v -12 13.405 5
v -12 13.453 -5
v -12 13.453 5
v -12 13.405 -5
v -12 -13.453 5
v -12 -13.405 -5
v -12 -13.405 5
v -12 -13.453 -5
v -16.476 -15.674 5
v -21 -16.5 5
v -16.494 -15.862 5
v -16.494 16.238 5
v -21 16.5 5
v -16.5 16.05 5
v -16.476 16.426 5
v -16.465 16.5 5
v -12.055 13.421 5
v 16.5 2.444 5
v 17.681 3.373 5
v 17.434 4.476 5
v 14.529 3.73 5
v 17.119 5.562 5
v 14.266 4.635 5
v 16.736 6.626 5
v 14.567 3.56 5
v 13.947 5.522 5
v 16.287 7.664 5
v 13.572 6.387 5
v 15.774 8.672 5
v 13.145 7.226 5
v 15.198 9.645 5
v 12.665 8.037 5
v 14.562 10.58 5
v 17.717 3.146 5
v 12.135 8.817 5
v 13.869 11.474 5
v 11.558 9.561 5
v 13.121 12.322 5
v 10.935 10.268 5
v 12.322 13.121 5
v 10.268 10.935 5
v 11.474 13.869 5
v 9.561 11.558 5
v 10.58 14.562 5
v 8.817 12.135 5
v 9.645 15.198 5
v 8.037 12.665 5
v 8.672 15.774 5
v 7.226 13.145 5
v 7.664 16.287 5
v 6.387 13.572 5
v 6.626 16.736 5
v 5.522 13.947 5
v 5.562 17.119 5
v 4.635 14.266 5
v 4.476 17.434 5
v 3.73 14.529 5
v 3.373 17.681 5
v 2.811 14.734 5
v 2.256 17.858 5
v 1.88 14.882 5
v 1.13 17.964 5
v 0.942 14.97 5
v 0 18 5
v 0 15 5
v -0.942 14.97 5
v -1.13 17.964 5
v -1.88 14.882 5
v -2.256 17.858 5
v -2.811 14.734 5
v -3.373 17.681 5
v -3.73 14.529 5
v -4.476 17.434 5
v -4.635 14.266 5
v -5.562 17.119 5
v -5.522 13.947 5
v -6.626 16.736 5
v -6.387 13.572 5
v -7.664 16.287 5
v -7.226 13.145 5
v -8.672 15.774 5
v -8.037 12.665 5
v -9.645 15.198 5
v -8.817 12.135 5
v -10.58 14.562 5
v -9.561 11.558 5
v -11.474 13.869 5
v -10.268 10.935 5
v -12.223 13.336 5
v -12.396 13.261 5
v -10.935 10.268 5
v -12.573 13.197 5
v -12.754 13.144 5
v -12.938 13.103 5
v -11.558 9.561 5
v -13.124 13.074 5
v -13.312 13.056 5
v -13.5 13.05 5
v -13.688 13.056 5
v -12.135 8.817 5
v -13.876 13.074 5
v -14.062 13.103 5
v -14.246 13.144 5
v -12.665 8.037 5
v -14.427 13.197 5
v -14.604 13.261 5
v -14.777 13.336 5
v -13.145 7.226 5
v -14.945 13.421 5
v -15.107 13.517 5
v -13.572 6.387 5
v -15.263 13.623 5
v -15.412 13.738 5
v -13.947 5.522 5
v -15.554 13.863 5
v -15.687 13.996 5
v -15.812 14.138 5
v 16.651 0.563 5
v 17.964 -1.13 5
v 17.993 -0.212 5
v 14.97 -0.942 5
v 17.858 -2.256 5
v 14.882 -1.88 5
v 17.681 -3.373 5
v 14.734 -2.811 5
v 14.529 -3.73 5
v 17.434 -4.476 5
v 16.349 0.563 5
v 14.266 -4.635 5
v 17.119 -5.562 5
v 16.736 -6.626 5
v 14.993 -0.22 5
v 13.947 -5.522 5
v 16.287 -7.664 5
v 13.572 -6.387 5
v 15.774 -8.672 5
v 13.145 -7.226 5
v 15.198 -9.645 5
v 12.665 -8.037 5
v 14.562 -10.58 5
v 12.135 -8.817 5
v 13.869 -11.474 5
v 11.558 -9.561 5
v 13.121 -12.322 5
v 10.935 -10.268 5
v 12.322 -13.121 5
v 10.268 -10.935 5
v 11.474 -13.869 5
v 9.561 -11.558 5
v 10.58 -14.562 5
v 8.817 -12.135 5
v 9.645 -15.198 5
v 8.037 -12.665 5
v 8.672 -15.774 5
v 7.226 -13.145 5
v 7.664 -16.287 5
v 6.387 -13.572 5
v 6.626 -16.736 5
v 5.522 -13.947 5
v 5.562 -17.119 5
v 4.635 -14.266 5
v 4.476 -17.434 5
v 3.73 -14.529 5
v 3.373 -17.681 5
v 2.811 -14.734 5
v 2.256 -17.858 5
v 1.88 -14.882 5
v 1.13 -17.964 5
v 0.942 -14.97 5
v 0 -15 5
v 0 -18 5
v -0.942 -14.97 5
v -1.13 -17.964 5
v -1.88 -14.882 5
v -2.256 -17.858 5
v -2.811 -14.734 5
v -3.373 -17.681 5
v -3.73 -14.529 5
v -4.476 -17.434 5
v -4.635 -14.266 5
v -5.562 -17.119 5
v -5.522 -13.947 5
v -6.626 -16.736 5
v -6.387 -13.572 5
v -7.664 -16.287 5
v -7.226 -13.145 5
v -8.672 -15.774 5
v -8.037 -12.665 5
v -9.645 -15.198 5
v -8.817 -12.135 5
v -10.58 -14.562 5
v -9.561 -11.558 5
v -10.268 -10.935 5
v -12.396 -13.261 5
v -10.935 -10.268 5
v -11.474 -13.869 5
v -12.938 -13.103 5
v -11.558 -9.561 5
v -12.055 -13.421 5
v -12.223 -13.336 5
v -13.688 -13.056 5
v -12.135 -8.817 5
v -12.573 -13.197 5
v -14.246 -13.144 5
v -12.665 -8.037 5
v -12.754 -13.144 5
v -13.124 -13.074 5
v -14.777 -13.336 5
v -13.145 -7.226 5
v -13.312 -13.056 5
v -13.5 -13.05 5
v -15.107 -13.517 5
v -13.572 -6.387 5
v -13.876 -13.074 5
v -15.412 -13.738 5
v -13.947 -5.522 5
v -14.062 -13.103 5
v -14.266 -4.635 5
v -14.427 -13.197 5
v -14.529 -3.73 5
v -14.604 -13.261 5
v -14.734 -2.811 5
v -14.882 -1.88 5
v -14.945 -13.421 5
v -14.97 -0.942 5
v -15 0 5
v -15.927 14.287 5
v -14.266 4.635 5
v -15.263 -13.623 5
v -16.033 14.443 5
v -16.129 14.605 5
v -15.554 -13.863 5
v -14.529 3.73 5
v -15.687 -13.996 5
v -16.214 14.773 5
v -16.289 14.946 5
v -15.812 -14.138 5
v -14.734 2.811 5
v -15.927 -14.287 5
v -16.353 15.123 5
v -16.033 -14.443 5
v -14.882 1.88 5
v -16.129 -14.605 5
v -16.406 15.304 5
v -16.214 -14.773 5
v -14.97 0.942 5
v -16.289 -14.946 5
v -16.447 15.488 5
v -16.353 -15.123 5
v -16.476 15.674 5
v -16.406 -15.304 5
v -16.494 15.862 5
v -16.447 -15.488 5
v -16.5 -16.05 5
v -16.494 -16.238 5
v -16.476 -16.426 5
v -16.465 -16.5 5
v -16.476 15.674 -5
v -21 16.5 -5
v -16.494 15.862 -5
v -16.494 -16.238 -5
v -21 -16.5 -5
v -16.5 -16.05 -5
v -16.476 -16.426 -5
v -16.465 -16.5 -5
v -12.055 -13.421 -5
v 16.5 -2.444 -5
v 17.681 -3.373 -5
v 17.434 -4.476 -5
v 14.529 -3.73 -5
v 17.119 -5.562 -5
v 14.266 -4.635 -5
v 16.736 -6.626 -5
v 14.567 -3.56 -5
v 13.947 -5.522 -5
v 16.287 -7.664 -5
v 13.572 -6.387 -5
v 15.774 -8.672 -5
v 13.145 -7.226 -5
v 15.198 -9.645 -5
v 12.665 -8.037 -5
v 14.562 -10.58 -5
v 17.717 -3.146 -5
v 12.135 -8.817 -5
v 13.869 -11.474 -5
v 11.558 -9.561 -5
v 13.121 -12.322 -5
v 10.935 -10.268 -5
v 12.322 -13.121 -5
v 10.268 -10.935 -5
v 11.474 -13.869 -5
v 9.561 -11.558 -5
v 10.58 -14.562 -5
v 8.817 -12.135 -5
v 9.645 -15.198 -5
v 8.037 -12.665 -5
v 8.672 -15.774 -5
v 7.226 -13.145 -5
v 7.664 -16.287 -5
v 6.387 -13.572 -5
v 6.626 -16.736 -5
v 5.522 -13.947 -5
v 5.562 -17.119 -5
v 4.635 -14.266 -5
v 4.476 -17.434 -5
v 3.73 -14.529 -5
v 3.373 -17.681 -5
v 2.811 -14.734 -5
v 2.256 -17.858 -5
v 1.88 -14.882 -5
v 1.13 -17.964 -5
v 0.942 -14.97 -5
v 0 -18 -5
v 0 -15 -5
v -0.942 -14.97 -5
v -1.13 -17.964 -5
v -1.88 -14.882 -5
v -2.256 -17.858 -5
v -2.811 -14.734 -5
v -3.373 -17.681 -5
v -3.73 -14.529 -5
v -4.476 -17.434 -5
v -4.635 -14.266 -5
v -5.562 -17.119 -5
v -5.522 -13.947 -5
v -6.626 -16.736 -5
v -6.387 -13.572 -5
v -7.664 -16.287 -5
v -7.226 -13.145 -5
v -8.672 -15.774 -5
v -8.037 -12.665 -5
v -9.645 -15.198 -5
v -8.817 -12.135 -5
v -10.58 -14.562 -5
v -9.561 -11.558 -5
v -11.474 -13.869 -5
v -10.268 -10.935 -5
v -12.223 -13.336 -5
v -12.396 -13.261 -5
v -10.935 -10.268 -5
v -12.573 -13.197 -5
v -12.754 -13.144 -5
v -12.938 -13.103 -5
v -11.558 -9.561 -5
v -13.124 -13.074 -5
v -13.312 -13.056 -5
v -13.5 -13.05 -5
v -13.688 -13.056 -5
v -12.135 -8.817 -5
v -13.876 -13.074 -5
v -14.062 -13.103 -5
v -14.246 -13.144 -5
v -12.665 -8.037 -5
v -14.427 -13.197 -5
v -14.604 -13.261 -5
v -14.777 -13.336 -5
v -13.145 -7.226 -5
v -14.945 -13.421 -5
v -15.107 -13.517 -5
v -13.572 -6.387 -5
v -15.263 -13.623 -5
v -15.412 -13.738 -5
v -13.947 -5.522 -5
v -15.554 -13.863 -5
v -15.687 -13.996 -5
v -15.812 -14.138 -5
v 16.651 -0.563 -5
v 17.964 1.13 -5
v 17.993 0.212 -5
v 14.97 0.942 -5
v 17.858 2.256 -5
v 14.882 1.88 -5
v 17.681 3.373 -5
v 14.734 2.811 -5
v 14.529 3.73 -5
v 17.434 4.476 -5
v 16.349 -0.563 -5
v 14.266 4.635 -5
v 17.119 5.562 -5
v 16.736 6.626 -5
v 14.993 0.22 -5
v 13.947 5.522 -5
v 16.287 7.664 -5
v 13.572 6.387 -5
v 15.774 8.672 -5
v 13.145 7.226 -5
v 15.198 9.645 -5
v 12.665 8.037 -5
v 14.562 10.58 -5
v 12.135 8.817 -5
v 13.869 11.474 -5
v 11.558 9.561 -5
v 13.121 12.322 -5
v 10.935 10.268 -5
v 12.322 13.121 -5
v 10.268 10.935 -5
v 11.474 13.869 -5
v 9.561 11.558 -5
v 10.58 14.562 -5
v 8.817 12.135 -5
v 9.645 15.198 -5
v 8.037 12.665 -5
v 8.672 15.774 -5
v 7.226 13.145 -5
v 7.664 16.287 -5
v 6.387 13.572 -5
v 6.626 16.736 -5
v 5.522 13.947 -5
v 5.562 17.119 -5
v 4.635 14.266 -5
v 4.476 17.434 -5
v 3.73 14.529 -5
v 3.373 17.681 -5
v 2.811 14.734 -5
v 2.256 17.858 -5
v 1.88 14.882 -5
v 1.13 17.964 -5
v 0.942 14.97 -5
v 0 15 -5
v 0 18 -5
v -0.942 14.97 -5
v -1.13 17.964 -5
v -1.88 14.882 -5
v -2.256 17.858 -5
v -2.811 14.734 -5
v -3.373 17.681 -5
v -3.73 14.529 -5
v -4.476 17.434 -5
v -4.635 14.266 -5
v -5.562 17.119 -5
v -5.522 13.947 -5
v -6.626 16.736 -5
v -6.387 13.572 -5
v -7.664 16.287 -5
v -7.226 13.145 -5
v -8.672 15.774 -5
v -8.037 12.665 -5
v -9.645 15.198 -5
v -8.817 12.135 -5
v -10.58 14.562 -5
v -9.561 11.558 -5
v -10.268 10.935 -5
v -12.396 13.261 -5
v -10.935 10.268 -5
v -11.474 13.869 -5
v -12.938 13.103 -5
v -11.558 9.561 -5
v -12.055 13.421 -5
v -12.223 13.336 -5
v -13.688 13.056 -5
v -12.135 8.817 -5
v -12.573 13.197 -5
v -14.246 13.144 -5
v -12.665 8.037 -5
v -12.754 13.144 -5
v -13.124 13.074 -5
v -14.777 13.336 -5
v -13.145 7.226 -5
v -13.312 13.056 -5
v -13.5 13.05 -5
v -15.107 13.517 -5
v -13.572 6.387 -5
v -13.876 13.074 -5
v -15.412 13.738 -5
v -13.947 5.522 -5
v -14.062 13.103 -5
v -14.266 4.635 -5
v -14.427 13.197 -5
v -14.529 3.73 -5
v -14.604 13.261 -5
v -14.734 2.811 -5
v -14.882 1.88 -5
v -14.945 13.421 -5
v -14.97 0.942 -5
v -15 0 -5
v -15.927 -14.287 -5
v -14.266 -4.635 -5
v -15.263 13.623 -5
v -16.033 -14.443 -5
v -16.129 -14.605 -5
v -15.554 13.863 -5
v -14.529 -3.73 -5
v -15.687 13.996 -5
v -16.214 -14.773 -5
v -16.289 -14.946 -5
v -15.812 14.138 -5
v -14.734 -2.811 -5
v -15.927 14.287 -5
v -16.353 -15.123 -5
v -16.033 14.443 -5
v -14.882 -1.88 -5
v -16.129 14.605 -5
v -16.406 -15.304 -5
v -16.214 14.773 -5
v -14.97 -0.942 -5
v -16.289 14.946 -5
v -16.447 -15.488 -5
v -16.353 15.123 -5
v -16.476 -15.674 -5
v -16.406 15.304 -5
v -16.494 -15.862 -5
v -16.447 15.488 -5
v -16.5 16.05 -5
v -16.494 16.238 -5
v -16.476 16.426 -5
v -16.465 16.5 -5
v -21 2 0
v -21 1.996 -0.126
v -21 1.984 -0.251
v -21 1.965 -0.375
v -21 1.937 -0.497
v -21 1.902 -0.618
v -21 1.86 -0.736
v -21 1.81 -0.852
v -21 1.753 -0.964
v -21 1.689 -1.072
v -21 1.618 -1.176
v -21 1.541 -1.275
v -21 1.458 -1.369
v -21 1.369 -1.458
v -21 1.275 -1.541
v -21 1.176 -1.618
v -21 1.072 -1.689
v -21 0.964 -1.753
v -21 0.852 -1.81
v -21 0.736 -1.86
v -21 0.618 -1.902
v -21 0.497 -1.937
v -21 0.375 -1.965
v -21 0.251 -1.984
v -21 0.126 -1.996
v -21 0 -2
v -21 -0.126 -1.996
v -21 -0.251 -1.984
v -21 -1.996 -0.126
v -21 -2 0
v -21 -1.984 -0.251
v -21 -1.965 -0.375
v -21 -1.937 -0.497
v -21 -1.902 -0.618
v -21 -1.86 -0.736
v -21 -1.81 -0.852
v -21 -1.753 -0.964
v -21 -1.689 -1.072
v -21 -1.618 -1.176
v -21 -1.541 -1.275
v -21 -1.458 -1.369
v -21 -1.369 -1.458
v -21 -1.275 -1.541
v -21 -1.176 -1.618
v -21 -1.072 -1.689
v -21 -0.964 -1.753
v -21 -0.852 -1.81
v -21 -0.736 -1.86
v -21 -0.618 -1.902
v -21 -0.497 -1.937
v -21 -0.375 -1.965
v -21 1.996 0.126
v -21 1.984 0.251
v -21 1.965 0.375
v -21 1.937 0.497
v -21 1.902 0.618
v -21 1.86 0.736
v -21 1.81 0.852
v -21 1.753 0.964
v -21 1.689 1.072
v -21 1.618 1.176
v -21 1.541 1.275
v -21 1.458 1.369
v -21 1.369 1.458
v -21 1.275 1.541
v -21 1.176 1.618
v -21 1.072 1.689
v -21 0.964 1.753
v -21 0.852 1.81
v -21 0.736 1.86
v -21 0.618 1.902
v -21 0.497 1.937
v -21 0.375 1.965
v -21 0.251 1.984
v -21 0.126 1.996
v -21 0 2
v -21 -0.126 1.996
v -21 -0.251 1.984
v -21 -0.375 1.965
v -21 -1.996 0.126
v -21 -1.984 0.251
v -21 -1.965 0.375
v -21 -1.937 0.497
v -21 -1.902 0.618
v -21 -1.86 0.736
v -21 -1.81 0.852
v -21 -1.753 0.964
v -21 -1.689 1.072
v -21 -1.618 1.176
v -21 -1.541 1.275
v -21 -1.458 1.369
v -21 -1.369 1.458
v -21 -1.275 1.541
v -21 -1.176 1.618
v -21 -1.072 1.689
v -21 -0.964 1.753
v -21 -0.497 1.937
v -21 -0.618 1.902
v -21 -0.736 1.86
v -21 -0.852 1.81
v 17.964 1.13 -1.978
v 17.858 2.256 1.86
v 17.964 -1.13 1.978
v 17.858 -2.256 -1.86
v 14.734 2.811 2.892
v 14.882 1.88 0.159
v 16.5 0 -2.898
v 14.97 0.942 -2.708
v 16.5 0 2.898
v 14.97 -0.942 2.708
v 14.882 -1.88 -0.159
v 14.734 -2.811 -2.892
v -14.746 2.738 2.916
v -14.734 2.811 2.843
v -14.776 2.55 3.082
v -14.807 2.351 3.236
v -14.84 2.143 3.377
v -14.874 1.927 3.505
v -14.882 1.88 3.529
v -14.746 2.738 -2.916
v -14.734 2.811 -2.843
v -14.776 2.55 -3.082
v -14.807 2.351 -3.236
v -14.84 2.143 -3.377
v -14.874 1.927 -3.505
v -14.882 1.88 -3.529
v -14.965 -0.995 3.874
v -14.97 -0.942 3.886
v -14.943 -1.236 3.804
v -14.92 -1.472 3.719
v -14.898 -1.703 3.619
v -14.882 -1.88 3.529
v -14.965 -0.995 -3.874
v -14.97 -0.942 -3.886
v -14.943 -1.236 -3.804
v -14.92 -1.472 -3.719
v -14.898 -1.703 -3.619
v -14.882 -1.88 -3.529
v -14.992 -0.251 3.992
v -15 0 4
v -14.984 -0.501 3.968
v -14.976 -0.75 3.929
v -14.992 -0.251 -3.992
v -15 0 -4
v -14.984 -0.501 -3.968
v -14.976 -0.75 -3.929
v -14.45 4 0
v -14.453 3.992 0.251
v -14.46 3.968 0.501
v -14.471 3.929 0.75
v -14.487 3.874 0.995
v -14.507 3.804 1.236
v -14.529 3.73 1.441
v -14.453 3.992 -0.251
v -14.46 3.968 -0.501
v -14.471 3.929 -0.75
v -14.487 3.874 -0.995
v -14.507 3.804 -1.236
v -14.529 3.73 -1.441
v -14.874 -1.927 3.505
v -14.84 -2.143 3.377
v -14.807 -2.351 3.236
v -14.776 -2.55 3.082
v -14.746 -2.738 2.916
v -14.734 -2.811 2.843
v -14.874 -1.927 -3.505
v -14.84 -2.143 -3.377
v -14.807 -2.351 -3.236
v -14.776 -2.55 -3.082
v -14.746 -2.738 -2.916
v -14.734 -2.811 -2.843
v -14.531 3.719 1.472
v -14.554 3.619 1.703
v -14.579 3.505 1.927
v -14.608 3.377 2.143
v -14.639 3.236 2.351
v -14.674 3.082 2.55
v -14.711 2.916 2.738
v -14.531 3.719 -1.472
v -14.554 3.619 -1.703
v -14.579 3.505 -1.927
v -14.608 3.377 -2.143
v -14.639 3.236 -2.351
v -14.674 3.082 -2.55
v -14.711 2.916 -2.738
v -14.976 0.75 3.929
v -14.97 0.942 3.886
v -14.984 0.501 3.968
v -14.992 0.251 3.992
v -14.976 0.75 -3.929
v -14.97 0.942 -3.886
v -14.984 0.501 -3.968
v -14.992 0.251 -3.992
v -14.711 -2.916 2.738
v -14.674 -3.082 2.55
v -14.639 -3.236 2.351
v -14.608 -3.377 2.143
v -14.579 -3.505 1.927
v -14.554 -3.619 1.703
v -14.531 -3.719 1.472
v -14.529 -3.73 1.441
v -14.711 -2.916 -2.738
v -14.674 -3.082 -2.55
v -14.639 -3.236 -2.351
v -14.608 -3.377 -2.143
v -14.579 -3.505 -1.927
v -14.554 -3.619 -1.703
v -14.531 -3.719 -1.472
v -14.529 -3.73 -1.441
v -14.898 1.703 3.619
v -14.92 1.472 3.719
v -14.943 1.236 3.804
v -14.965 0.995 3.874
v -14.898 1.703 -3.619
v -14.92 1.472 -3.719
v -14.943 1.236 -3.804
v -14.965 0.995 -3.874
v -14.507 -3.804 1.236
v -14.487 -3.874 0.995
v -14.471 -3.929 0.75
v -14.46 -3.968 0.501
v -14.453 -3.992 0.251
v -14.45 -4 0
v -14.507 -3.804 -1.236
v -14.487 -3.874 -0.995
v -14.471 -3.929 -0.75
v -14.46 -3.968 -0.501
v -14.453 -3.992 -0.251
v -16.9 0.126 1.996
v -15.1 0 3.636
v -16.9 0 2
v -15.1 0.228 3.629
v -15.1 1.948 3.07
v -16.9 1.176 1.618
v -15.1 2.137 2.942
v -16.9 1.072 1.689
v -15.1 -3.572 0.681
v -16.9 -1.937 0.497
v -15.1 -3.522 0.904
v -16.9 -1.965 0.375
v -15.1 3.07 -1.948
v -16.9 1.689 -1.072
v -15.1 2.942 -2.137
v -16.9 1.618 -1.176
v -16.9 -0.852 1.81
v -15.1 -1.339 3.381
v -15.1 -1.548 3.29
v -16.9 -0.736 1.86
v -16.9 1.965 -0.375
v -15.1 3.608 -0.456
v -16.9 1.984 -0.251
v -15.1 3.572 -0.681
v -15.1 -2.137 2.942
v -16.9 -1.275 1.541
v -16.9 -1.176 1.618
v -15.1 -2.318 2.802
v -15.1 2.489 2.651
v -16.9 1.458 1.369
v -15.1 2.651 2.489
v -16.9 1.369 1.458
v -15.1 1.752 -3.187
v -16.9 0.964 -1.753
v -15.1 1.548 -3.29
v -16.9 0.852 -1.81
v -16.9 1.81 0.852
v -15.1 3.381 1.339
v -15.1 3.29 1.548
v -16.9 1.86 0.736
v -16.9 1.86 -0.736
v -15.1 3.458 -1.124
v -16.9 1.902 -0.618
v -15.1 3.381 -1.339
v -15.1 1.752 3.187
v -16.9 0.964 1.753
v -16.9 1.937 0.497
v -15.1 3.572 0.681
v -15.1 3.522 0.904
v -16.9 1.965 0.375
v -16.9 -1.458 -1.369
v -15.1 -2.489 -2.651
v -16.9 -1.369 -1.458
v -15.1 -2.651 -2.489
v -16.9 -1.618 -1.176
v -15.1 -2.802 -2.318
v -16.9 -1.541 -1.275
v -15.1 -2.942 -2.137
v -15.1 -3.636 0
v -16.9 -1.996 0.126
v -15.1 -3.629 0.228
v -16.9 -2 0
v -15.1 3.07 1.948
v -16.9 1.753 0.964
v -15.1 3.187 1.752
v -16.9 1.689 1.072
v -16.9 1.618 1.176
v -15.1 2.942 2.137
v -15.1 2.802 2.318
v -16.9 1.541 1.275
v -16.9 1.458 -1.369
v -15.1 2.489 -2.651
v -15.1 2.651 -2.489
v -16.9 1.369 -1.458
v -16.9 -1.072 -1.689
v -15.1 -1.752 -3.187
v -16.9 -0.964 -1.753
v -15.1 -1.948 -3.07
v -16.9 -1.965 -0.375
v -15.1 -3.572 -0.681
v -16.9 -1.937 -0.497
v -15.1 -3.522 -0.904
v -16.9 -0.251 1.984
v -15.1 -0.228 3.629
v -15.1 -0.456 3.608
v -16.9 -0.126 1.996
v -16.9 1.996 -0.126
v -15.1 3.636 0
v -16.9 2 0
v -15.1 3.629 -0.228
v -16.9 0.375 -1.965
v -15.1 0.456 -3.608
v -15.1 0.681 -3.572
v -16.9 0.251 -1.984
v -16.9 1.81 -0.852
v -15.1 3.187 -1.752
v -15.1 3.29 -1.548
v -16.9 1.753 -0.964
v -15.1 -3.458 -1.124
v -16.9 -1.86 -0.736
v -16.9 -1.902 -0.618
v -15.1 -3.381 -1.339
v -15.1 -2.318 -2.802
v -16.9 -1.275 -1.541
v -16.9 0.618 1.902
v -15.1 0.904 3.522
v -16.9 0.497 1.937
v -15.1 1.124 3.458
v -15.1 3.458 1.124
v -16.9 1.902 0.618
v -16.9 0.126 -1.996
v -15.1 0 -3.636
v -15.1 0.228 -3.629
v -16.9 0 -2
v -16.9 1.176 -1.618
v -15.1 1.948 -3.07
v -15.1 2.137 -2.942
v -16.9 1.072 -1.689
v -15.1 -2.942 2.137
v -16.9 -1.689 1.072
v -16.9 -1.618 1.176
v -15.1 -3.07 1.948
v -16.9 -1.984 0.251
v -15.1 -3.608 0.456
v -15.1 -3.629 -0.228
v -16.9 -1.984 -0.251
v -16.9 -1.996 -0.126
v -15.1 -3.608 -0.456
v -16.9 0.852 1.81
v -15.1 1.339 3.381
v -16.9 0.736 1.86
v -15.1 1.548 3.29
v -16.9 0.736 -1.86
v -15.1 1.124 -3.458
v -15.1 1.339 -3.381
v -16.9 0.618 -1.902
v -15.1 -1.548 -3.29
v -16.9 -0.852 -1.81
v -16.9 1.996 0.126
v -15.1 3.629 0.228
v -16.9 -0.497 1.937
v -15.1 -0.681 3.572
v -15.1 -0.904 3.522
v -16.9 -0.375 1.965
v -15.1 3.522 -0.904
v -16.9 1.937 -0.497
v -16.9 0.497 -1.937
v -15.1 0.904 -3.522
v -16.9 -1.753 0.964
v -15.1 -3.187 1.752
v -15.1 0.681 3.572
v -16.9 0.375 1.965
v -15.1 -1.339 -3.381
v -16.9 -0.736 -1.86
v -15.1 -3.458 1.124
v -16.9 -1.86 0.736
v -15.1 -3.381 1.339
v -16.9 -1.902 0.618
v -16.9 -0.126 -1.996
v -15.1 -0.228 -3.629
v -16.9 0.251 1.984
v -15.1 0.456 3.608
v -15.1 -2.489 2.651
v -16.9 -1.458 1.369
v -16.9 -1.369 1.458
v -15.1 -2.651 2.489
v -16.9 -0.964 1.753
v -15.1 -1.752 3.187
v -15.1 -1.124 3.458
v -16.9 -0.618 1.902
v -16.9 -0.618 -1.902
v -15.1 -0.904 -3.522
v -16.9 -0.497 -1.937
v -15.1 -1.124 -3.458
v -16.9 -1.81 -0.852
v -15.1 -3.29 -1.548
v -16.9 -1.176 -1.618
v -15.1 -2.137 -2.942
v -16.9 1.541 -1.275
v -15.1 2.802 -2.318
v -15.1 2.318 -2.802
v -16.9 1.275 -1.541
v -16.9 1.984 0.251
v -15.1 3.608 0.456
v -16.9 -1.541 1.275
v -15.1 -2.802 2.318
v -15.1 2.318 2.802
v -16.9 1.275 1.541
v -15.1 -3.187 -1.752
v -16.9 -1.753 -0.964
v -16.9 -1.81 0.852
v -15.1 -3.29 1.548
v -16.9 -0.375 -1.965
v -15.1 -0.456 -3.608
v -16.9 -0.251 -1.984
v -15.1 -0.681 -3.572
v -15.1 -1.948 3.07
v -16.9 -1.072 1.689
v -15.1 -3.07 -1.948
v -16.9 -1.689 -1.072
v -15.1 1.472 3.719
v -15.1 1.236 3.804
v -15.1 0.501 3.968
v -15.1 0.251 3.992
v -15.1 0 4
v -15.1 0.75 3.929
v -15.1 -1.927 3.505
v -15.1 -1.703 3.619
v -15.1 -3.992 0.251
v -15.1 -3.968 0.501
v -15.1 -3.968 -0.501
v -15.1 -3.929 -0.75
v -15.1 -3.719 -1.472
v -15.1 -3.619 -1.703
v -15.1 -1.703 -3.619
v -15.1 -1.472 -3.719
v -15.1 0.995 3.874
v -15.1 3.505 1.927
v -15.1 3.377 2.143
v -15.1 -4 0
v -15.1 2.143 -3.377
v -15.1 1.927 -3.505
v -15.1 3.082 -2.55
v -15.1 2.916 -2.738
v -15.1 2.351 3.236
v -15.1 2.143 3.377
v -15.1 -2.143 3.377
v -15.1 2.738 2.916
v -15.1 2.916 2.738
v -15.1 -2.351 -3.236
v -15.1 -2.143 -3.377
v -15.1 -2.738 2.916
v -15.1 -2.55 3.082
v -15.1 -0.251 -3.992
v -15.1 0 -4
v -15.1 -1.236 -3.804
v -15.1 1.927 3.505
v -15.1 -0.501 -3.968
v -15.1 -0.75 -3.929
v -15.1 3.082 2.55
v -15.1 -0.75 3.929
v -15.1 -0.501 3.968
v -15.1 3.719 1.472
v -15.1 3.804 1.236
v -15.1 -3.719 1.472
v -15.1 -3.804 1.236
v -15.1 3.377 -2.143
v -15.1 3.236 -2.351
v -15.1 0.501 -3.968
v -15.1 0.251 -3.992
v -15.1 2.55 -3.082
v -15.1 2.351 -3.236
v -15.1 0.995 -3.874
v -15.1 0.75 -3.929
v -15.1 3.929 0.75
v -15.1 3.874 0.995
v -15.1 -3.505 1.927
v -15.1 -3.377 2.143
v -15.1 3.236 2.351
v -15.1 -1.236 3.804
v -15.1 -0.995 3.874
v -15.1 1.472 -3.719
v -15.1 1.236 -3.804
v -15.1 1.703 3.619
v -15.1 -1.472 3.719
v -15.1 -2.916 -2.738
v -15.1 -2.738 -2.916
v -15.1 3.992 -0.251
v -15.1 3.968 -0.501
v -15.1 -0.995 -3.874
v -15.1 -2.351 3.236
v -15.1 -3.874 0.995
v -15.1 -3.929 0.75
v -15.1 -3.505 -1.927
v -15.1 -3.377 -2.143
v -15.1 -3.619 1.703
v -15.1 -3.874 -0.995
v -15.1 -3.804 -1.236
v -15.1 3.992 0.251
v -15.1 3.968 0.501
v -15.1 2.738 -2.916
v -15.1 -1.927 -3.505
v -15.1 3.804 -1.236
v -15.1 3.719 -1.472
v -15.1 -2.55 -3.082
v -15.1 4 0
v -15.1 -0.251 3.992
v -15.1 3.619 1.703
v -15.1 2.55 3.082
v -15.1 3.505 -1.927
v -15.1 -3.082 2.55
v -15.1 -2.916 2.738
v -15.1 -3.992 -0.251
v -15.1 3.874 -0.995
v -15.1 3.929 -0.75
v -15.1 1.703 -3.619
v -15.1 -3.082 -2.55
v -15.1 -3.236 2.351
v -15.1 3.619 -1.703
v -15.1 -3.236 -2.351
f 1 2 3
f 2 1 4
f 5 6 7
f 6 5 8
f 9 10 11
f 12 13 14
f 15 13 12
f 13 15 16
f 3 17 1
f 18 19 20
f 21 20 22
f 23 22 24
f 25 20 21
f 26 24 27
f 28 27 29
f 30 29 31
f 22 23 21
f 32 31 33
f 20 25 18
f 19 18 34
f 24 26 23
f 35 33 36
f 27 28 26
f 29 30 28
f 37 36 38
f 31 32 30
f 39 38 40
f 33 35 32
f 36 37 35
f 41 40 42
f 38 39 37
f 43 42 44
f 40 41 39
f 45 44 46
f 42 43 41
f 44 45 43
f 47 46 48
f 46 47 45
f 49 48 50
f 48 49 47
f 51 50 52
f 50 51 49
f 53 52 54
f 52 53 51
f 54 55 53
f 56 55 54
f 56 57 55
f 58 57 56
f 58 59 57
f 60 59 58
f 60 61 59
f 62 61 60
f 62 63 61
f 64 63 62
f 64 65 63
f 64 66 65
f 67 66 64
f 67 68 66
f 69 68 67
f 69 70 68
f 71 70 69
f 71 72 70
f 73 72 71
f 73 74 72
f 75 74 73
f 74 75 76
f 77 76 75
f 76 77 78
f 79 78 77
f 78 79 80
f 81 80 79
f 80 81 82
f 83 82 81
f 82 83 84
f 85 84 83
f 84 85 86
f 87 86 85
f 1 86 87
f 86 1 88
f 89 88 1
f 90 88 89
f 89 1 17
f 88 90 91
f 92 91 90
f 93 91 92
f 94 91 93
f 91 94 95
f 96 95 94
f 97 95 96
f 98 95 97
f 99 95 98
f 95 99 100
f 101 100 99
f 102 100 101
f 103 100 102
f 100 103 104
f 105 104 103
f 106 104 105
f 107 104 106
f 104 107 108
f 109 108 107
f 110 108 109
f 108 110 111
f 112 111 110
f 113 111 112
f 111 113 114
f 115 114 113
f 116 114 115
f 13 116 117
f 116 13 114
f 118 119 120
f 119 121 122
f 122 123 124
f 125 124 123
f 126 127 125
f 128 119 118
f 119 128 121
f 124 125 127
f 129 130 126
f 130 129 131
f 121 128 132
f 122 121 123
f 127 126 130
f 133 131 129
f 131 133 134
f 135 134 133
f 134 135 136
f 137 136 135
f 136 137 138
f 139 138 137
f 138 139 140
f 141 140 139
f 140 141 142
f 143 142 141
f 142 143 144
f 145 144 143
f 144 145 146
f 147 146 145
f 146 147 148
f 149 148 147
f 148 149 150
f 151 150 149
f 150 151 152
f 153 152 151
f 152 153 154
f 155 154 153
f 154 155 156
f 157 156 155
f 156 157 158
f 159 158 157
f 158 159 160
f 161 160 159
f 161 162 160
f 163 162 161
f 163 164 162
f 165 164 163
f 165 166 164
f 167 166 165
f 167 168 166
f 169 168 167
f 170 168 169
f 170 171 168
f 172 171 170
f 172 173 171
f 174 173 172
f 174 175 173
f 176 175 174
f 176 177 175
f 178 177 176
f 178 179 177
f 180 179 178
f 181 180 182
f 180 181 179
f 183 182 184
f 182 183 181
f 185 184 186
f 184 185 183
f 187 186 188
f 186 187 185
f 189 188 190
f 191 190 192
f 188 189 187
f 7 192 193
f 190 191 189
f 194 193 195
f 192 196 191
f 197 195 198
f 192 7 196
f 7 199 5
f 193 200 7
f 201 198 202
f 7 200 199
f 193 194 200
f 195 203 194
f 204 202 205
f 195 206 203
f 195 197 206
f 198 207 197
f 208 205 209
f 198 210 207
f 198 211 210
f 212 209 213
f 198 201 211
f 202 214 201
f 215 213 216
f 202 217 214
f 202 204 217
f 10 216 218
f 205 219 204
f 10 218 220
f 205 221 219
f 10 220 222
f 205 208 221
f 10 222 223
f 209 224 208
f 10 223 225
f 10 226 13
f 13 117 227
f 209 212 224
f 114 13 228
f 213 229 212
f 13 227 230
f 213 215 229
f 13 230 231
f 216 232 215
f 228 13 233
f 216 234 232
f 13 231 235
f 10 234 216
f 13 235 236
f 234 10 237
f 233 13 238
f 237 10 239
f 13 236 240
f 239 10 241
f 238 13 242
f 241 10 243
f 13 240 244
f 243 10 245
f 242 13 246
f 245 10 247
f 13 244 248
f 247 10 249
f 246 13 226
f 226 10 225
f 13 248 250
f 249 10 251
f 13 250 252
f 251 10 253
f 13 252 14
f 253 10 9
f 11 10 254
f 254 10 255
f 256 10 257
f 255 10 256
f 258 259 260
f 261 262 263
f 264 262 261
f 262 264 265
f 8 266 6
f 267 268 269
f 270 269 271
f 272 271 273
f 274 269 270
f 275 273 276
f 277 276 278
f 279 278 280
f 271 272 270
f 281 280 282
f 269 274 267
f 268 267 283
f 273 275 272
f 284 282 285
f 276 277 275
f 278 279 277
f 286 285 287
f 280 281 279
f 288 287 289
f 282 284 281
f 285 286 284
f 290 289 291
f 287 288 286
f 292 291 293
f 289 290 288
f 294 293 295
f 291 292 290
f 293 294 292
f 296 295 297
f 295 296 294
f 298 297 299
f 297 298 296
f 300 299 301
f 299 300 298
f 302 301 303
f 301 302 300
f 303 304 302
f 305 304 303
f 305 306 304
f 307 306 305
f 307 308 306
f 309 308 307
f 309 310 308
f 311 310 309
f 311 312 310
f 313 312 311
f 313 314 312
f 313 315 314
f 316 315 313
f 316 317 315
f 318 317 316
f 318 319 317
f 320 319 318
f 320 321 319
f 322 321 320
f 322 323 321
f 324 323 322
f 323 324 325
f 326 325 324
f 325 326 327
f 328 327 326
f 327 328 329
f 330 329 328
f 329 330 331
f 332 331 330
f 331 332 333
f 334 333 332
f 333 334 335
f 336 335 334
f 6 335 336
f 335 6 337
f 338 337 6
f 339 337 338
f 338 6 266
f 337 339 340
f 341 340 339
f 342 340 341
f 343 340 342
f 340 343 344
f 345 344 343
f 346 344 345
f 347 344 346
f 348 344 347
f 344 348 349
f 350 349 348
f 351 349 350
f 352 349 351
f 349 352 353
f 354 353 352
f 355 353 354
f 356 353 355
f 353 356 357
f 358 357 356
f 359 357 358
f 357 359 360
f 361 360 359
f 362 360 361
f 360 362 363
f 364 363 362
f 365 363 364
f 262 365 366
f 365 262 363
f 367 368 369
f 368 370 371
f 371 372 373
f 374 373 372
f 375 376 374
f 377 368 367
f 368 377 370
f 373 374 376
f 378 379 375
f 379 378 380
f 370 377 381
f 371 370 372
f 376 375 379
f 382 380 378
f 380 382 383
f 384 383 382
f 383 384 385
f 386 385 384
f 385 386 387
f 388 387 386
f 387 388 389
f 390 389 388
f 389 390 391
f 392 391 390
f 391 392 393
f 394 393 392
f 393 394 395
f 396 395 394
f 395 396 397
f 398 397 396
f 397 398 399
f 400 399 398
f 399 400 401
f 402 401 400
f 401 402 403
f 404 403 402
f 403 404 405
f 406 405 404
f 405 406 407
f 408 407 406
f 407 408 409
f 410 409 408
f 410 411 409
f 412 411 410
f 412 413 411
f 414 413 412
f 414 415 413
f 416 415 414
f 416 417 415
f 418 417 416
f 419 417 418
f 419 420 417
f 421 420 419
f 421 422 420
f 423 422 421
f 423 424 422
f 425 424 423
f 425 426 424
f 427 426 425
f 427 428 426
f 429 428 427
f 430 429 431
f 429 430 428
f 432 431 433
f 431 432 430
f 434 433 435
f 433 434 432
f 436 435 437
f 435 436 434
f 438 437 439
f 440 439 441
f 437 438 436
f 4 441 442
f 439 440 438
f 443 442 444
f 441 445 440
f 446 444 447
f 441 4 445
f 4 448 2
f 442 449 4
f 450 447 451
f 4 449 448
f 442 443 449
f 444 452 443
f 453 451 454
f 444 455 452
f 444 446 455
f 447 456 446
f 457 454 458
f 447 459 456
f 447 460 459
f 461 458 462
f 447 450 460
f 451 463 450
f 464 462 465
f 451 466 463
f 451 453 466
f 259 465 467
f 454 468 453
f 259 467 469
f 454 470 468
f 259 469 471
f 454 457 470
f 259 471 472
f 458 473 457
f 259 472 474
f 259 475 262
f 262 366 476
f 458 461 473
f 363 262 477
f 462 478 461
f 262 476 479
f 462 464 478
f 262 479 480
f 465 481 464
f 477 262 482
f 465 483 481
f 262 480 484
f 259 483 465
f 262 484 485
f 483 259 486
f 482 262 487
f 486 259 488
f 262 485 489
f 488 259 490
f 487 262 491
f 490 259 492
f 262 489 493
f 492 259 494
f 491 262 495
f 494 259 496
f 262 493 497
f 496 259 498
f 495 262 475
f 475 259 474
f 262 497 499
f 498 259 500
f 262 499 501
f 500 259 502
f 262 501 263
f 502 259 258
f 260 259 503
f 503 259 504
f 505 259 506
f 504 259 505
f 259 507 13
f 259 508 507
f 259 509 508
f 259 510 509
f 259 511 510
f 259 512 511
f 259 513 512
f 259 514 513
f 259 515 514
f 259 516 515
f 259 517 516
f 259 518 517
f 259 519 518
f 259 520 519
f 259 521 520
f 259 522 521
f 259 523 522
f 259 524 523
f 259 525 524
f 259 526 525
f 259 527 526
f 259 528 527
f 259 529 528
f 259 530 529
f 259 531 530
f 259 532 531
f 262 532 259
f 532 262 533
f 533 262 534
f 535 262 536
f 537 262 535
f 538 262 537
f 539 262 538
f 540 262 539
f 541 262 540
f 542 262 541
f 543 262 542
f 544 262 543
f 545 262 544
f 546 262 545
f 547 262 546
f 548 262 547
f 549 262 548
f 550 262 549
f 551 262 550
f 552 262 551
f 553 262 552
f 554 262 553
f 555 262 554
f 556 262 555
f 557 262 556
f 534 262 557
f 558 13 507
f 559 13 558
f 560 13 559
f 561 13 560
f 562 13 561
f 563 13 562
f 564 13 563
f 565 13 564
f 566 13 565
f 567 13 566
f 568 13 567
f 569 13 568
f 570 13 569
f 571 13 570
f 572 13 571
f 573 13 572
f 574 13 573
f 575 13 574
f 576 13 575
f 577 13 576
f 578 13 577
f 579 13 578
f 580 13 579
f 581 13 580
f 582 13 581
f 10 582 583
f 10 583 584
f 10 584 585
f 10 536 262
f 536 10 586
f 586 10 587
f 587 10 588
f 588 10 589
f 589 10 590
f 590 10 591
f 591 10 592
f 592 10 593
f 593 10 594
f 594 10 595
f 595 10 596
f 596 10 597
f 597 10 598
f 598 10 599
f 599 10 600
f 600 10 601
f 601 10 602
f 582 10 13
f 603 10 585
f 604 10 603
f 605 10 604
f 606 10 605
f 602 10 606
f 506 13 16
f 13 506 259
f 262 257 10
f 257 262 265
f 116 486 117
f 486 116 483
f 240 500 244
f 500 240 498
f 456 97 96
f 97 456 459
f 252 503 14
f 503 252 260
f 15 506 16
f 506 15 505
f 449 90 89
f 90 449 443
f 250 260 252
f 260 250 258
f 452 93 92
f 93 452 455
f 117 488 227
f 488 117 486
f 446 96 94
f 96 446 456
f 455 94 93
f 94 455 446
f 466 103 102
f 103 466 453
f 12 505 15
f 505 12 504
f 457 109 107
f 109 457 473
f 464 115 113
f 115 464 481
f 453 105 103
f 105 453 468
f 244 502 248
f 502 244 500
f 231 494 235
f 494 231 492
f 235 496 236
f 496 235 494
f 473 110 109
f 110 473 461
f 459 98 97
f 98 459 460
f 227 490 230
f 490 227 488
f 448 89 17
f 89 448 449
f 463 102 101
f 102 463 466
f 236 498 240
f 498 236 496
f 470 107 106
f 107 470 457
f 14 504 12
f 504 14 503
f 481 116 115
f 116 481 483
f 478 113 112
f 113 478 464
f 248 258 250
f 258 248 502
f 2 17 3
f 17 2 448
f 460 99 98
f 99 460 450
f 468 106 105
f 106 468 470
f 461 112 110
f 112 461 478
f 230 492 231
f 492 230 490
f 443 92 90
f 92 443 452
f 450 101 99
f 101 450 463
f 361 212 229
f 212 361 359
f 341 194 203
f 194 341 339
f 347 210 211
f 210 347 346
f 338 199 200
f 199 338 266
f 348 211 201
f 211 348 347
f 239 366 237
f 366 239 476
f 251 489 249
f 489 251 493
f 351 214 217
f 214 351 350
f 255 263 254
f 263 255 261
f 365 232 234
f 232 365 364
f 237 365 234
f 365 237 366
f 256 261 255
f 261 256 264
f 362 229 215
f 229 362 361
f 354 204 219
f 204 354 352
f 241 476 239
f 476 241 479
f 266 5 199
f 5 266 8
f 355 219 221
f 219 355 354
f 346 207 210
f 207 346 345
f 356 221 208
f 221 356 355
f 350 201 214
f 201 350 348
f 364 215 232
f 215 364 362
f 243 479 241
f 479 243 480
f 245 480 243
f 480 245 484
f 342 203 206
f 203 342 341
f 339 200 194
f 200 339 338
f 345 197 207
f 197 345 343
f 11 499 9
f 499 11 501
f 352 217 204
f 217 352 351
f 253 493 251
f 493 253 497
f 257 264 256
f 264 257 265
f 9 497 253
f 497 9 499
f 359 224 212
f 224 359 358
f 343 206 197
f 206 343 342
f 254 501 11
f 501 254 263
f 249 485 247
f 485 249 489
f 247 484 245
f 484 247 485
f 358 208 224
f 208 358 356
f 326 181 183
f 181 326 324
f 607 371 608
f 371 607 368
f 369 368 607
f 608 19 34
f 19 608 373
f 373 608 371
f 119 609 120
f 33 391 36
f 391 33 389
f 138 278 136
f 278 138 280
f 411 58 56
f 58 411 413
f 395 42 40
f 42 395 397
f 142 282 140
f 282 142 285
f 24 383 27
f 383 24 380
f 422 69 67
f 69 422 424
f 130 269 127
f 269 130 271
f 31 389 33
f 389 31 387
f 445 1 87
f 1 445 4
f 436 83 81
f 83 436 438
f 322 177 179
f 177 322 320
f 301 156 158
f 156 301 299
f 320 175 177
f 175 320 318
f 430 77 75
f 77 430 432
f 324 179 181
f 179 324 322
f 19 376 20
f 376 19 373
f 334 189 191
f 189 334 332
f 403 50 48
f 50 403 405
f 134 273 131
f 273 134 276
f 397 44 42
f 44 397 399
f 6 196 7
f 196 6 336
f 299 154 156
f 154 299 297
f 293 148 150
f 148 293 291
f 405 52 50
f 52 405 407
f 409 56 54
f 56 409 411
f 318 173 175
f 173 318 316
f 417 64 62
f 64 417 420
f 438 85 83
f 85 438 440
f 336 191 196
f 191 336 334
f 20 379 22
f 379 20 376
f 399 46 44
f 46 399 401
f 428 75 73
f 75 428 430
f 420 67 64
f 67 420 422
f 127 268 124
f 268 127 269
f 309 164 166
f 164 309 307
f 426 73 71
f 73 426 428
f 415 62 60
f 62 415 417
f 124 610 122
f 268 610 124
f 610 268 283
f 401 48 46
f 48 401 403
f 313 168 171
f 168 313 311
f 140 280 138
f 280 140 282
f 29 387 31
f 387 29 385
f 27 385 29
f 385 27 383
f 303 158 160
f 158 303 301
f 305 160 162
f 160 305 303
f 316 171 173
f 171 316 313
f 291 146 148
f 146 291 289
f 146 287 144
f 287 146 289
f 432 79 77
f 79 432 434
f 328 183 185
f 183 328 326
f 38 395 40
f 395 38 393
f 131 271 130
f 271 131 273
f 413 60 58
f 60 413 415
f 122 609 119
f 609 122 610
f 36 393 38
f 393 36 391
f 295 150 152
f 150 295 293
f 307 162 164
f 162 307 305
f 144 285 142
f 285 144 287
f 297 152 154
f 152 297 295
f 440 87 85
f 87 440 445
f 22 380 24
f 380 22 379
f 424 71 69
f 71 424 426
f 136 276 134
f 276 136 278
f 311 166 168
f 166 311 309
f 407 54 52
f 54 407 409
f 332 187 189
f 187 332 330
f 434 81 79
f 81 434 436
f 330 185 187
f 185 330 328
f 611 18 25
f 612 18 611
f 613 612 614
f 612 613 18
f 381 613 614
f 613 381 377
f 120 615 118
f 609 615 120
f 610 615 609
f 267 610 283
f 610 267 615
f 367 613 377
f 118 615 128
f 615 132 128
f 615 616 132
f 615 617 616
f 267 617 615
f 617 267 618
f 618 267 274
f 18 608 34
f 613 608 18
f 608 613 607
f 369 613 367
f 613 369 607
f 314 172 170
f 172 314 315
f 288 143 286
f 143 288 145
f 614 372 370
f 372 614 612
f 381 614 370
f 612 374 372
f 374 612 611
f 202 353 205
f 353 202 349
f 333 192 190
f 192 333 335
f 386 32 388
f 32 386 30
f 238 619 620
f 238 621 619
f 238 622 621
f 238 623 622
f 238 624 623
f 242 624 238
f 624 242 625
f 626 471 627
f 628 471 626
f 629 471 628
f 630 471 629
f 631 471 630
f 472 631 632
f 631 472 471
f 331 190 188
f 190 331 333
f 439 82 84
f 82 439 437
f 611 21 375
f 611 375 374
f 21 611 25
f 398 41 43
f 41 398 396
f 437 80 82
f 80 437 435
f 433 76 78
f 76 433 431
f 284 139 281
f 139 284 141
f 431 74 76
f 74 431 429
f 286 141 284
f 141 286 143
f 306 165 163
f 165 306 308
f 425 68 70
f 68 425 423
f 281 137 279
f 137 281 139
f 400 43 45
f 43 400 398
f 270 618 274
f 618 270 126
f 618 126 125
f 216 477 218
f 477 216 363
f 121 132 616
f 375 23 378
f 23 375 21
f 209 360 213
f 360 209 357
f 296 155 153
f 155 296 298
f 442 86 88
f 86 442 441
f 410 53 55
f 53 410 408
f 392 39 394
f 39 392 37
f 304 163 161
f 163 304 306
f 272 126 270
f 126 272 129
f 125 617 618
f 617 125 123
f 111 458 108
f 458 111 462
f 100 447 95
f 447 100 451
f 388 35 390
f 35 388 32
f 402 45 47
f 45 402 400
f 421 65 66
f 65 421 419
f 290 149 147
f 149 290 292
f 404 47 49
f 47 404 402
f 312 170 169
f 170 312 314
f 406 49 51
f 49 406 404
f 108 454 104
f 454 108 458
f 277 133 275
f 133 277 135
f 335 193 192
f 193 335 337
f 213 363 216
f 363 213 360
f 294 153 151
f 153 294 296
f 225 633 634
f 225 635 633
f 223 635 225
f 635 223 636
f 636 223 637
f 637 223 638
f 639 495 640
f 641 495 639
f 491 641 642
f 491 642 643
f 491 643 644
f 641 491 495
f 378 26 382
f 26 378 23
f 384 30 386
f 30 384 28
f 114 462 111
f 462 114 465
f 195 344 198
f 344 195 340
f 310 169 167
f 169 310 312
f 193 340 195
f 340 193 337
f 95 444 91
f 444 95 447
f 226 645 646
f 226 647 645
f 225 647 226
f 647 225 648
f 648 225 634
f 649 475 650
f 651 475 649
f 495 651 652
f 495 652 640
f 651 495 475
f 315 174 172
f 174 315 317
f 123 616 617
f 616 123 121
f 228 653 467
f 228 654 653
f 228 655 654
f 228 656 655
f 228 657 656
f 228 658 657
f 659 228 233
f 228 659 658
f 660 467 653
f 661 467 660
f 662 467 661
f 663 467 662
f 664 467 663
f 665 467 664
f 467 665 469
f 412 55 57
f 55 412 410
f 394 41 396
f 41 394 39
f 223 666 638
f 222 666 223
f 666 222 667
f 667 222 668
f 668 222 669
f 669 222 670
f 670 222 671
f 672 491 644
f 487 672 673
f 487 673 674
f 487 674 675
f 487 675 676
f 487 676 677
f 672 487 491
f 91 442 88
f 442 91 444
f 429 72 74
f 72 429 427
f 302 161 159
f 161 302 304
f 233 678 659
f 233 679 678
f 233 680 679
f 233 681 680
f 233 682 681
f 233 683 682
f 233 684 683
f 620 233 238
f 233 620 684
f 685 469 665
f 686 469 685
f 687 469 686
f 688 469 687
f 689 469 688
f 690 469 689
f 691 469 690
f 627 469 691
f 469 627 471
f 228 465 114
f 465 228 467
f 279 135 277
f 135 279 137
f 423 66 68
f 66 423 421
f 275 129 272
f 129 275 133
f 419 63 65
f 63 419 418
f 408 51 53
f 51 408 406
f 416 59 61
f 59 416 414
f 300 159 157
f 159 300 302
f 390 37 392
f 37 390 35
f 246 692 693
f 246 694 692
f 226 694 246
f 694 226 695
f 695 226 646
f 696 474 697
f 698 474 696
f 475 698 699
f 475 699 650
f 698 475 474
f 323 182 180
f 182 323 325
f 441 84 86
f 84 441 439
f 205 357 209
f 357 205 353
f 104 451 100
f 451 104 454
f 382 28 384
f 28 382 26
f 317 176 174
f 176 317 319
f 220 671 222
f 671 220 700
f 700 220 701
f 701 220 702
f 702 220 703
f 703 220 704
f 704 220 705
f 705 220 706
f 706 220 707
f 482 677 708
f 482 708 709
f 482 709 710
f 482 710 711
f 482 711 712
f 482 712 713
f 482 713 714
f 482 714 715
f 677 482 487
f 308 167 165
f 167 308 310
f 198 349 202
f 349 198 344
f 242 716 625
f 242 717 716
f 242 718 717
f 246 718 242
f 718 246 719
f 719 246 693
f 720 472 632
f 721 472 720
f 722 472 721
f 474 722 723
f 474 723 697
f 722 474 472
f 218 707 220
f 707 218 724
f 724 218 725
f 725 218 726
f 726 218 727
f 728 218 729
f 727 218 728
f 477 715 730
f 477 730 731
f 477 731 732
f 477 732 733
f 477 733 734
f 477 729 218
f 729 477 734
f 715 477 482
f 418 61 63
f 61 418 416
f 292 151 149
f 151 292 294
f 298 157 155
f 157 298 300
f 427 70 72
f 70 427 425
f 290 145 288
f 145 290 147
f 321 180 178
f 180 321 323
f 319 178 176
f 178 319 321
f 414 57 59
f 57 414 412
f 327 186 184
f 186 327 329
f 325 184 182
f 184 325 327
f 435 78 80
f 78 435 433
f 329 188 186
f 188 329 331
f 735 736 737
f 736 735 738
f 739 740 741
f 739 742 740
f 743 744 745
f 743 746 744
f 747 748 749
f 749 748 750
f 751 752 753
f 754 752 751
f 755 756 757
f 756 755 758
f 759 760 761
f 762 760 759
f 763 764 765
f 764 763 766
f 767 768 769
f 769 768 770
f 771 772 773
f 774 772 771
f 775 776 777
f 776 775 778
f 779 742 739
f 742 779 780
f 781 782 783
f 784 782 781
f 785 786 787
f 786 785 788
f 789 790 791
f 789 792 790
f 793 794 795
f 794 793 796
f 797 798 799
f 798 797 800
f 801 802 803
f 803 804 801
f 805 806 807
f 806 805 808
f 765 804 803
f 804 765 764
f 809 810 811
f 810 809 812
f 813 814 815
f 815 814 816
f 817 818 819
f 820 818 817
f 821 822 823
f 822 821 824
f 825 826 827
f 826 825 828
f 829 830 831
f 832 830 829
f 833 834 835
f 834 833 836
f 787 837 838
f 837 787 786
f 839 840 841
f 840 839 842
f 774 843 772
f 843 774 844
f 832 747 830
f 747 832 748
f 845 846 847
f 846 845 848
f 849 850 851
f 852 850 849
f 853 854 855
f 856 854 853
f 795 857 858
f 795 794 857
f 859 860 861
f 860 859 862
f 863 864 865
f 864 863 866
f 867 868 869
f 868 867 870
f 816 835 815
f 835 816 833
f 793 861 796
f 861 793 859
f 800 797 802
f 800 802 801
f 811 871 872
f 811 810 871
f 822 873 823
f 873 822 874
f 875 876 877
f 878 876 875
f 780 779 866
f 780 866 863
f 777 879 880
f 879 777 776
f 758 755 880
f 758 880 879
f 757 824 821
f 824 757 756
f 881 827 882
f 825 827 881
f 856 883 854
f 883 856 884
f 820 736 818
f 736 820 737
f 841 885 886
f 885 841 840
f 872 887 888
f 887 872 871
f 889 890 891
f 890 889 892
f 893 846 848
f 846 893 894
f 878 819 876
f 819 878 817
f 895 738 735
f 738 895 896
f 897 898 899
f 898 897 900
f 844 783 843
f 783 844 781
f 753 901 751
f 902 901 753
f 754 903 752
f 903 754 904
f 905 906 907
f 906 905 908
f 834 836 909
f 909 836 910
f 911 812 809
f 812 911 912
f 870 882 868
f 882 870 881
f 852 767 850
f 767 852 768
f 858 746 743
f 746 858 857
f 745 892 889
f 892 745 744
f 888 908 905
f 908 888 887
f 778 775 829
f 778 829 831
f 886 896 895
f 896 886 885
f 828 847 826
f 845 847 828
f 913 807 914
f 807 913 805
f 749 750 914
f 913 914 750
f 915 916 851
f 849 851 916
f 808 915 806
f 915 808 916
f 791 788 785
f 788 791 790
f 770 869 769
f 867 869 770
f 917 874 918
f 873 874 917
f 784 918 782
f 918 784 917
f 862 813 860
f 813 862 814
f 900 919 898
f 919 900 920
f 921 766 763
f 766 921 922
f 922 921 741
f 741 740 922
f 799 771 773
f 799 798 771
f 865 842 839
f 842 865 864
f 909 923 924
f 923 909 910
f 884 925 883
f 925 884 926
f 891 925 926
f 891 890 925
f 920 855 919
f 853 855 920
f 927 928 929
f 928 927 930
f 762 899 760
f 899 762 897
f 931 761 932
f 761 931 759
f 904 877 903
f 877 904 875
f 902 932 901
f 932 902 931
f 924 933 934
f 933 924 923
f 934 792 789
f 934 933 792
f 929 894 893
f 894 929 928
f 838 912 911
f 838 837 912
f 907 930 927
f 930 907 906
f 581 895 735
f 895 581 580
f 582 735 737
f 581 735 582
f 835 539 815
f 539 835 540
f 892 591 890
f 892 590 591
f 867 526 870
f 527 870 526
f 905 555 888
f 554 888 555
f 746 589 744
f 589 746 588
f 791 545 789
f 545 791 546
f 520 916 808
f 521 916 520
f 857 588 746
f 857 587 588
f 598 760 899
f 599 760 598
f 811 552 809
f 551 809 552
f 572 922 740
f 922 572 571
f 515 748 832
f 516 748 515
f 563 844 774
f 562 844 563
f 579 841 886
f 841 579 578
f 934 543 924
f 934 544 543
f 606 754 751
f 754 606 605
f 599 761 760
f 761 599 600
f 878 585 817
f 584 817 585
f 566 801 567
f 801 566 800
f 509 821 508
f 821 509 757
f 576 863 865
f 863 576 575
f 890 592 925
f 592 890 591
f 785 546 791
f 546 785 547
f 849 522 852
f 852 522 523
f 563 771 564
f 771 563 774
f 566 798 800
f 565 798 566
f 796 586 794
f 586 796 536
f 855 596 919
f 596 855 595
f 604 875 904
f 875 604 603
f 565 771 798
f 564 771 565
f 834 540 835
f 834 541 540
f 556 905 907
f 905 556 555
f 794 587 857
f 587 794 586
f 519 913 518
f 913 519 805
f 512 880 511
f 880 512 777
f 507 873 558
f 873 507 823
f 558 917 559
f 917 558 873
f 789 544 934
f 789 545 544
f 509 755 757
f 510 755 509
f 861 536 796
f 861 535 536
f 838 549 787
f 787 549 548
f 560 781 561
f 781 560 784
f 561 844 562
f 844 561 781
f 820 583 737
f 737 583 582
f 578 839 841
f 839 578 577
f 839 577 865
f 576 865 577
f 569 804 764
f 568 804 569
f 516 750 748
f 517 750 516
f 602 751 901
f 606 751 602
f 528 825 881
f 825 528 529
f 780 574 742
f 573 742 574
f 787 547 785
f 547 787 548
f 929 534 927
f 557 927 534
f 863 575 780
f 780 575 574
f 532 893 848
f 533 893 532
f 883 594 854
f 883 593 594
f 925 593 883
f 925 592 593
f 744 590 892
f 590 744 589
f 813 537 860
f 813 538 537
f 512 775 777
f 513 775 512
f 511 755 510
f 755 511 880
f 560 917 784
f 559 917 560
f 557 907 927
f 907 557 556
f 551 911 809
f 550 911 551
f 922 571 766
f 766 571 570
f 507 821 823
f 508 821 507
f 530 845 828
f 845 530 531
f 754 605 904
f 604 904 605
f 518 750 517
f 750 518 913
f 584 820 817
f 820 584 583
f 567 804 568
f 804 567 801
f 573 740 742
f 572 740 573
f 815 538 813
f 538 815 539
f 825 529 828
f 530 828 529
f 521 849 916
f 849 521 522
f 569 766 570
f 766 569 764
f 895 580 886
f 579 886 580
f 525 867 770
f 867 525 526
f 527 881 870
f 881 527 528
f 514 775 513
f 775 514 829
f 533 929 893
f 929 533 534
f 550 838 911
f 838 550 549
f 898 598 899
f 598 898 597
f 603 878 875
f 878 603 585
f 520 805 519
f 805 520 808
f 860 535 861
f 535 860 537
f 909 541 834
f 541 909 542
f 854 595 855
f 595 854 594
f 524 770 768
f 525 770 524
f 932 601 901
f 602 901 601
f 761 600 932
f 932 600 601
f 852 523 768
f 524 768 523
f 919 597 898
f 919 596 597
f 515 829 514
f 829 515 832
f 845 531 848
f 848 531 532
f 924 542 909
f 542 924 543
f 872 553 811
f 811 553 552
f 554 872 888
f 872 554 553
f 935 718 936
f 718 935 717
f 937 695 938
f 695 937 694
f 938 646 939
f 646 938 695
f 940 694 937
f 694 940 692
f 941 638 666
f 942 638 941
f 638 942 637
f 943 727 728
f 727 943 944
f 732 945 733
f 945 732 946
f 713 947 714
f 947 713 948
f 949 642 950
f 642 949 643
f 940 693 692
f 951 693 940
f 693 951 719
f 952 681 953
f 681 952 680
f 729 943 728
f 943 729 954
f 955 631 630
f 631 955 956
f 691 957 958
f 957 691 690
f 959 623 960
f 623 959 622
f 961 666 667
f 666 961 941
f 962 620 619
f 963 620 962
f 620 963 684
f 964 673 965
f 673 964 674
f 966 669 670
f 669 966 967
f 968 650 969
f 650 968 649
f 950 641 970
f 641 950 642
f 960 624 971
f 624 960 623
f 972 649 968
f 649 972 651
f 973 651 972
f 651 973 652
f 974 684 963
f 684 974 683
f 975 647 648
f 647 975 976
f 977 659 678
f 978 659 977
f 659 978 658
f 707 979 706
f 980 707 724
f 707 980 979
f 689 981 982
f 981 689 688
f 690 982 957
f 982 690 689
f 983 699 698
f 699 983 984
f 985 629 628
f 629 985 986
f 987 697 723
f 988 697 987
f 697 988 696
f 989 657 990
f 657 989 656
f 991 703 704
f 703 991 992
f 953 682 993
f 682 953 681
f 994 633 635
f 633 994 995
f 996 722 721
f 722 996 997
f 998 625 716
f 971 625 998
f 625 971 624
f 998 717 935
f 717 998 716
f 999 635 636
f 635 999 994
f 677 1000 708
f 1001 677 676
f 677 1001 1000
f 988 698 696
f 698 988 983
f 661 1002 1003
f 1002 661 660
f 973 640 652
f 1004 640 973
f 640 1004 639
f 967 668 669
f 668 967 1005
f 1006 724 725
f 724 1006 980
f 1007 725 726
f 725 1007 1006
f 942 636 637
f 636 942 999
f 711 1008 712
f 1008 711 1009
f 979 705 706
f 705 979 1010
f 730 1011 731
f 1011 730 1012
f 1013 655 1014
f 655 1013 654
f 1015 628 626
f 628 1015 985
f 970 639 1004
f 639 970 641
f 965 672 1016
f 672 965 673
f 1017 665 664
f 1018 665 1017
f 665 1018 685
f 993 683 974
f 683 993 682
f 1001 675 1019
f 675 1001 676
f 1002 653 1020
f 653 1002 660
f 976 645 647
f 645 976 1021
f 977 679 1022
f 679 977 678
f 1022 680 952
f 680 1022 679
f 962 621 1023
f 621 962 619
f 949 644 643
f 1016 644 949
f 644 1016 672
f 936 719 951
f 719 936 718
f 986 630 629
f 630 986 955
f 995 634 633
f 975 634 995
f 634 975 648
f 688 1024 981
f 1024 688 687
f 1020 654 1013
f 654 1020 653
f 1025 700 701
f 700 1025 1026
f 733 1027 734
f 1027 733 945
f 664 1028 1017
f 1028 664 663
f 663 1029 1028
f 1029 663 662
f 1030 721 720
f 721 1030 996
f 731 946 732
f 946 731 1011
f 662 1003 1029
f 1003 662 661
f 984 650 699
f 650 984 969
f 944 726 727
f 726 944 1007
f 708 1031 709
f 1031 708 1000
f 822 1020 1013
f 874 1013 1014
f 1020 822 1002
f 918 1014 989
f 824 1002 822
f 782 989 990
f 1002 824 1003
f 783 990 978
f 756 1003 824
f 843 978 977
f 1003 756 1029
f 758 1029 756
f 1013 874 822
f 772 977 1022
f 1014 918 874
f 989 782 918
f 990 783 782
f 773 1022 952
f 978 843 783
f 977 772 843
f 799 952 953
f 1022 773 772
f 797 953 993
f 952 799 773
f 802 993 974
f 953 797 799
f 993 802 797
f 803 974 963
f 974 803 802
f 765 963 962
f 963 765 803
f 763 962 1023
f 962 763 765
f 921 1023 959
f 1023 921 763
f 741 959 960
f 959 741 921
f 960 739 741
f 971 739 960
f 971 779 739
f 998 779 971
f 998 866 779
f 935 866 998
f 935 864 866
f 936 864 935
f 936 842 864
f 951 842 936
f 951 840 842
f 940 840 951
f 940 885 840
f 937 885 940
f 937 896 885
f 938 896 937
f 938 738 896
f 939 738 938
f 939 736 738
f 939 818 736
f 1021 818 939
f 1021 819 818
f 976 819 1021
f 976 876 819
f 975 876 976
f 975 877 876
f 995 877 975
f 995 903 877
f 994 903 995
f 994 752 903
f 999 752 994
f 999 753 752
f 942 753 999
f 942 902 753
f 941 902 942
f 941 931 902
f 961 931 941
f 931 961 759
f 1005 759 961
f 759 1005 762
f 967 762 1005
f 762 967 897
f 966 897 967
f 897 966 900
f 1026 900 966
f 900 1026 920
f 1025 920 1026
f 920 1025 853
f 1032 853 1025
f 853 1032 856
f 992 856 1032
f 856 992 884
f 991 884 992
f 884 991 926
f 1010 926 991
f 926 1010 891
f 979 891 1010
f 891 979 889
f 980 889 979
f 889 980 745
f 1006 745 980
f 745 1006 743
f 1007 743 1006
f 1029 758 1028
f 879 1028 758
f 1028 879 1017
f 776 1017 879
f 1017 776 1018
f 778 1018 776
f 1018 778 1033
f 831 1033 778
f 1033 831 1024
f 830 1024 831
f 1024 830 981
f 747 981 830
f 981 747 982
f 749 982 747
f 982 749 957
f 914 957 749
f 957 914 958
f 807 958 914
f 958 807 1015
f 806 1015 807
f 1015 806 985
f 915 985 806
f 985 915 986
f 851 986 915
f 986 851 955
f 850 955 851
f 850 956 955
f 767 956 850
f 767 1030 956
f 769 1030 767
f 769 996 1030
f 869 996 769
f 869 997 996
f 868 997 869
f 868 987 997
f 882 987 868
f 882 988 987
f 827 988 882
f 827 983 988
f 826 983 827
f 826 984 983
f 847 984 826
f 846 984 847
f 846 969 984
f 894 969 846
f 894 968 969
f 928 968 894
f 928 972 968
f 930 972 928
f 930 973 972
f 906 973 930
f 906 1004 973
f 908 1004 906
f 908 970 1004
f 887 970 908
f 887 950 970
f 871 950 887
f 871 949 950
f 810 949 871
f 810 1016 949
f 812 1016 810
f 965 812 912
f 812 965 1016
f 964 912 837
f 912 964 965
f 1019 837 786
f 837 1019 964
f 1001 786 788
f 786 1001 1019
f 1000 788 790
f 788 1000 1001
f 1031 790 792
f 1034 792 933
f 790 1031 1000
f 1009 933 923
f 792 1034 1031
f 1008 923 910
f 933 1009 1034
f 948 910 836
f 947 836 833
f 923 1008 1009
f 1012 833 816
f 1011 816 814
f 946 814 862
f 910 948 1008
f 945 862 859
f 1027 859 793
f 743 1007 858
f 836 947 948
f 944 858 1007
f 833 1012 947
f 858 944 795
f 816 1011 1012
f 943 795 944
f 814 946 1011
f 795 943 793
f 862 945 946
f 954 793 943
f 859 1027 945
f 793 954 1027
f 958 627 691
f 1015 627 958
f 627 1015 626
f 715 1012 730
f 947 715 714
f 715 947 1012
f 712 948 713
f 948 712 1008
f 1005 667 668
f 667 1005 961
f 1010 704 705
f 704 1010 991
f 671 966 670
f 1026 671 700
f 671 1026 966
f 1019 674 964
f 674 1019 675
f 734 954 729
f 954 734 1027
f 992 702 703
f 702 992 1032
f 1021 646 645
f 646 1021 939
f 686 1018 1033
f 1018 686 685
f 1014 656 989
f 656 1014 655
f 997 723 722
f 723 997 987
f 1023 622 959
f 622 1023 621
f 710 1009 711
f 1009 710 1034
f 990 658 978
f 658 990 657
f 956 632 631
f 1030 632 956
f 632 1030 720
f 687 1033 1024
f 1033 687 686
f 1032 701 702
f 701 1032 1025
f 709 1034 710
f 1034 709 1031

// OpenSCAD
// cable_holder.scad
// library for parametric Cable Holder, Clip, Hook, Hanger, Loop
// Author: Tony Z. Tonchev, Michigan (USA) 
// last update: November 2018


// (in mm)
Clip_Diameter = 30;

// (in mm)
Clip_Thickness = 10;

// #4-3mm, #6-3.5mm, #8-4mm, #9-4.5mm, #10-5mm (in mm)
Screw_Gauge = 4;

// (Front or Side)
Clip_Split = 0; // [0:Front,1:Side]


/* [Hidden] */

$fn=100;
TZT_Rad=Clip_Diameter/2;
TZT_Thk=Clip_Thickness;
TZT_Scr=Screw_Gauge;
TZT_Slt=Clip_Split;

difference () {
    TZT_CLIP();
    if ((TZT_Thk/8)<TZT_Scr) {
        TZT_SCREW();
    } else {
        translate ([0,0,TZT_Thk/4]) {
            TZT_SCREW();
        }
        translate ([0,0,-TZT_Thk/4]) {
            TZT_SCREW();
        }
       
    }
}

module TZT_SCREW () {
    translate ([-TZT_Rad*.98,0,0]) {
        rotate ([0,-90,0]) {
            cylinder (TZT_Scr*1.1,TZT_Scr,0);
            cylinder (TZT_Rad*.6,TZT_Scr/2,TZT_Scr/2);
            translate ([0,0,-TZT_Scr]) {
                cylinder (TZT_Scr*1.1,TZT_Scr,TZT_Scr);
            }
            if ((TZT_Slt==1)&&((TZT_Thk/3)>TZT_Scr)) {
                translate ([0,0,-TZT_Rad*3]) {
                    cylinder (TZT_Rad*3,TZT_Scr*.7,TZT_Scr*.7);
                }
            }
        }
    }
}

module TZT_CLIP () {
    difference () {
        union () {
            translate ([-TZT_Rad*1.1,0,0]) {
                difference () {
                    cube ([TZT_Rad*.6,TZT_Rad*2.2,TZT_Thk],true) ;
                    translate ([TZT_Rad*.2,TZT_Rad*1.07,0]) {
                        cylinder (TZT_Thk*1.1,TZT_Rad*.2,TZT_Rad*.2,true);
                    }
                    translate ([TZT_Rad*.2,-TZT_Rad*1.07,0]) {
                        cylinder (TZT_Thk*1.1,TZT_Rad*.2,TZT_Rad*.2,true);
                    }

                }
            }
            cylinder (TZT_Thk,TZT_Rad*1.2,TZT_Rad*1.2,true);
        }
        cylinder (TZT_Thk*4,TZT_Rad,TZT_Rad,true);
        
        if (TZT_Slt==1) {
            rotate ([0,0,90]) TZT_SPLIT();
        } else {
            TZT_SPLIT();
        }       
    }
    module TZT_SPLIT () {
        translate ([TZT_Rad*1.1,0,0]) {
            for (TZT_i=[-30:30:30]) {
                rotate ([-TZT_Rad*10/TZT_Thk,0,TZT_i]) {
                    cube ([TZT_Rad,TZT_Rad*.1,TZT_Thk*2],true);
                }
            }
        }
    }
}
